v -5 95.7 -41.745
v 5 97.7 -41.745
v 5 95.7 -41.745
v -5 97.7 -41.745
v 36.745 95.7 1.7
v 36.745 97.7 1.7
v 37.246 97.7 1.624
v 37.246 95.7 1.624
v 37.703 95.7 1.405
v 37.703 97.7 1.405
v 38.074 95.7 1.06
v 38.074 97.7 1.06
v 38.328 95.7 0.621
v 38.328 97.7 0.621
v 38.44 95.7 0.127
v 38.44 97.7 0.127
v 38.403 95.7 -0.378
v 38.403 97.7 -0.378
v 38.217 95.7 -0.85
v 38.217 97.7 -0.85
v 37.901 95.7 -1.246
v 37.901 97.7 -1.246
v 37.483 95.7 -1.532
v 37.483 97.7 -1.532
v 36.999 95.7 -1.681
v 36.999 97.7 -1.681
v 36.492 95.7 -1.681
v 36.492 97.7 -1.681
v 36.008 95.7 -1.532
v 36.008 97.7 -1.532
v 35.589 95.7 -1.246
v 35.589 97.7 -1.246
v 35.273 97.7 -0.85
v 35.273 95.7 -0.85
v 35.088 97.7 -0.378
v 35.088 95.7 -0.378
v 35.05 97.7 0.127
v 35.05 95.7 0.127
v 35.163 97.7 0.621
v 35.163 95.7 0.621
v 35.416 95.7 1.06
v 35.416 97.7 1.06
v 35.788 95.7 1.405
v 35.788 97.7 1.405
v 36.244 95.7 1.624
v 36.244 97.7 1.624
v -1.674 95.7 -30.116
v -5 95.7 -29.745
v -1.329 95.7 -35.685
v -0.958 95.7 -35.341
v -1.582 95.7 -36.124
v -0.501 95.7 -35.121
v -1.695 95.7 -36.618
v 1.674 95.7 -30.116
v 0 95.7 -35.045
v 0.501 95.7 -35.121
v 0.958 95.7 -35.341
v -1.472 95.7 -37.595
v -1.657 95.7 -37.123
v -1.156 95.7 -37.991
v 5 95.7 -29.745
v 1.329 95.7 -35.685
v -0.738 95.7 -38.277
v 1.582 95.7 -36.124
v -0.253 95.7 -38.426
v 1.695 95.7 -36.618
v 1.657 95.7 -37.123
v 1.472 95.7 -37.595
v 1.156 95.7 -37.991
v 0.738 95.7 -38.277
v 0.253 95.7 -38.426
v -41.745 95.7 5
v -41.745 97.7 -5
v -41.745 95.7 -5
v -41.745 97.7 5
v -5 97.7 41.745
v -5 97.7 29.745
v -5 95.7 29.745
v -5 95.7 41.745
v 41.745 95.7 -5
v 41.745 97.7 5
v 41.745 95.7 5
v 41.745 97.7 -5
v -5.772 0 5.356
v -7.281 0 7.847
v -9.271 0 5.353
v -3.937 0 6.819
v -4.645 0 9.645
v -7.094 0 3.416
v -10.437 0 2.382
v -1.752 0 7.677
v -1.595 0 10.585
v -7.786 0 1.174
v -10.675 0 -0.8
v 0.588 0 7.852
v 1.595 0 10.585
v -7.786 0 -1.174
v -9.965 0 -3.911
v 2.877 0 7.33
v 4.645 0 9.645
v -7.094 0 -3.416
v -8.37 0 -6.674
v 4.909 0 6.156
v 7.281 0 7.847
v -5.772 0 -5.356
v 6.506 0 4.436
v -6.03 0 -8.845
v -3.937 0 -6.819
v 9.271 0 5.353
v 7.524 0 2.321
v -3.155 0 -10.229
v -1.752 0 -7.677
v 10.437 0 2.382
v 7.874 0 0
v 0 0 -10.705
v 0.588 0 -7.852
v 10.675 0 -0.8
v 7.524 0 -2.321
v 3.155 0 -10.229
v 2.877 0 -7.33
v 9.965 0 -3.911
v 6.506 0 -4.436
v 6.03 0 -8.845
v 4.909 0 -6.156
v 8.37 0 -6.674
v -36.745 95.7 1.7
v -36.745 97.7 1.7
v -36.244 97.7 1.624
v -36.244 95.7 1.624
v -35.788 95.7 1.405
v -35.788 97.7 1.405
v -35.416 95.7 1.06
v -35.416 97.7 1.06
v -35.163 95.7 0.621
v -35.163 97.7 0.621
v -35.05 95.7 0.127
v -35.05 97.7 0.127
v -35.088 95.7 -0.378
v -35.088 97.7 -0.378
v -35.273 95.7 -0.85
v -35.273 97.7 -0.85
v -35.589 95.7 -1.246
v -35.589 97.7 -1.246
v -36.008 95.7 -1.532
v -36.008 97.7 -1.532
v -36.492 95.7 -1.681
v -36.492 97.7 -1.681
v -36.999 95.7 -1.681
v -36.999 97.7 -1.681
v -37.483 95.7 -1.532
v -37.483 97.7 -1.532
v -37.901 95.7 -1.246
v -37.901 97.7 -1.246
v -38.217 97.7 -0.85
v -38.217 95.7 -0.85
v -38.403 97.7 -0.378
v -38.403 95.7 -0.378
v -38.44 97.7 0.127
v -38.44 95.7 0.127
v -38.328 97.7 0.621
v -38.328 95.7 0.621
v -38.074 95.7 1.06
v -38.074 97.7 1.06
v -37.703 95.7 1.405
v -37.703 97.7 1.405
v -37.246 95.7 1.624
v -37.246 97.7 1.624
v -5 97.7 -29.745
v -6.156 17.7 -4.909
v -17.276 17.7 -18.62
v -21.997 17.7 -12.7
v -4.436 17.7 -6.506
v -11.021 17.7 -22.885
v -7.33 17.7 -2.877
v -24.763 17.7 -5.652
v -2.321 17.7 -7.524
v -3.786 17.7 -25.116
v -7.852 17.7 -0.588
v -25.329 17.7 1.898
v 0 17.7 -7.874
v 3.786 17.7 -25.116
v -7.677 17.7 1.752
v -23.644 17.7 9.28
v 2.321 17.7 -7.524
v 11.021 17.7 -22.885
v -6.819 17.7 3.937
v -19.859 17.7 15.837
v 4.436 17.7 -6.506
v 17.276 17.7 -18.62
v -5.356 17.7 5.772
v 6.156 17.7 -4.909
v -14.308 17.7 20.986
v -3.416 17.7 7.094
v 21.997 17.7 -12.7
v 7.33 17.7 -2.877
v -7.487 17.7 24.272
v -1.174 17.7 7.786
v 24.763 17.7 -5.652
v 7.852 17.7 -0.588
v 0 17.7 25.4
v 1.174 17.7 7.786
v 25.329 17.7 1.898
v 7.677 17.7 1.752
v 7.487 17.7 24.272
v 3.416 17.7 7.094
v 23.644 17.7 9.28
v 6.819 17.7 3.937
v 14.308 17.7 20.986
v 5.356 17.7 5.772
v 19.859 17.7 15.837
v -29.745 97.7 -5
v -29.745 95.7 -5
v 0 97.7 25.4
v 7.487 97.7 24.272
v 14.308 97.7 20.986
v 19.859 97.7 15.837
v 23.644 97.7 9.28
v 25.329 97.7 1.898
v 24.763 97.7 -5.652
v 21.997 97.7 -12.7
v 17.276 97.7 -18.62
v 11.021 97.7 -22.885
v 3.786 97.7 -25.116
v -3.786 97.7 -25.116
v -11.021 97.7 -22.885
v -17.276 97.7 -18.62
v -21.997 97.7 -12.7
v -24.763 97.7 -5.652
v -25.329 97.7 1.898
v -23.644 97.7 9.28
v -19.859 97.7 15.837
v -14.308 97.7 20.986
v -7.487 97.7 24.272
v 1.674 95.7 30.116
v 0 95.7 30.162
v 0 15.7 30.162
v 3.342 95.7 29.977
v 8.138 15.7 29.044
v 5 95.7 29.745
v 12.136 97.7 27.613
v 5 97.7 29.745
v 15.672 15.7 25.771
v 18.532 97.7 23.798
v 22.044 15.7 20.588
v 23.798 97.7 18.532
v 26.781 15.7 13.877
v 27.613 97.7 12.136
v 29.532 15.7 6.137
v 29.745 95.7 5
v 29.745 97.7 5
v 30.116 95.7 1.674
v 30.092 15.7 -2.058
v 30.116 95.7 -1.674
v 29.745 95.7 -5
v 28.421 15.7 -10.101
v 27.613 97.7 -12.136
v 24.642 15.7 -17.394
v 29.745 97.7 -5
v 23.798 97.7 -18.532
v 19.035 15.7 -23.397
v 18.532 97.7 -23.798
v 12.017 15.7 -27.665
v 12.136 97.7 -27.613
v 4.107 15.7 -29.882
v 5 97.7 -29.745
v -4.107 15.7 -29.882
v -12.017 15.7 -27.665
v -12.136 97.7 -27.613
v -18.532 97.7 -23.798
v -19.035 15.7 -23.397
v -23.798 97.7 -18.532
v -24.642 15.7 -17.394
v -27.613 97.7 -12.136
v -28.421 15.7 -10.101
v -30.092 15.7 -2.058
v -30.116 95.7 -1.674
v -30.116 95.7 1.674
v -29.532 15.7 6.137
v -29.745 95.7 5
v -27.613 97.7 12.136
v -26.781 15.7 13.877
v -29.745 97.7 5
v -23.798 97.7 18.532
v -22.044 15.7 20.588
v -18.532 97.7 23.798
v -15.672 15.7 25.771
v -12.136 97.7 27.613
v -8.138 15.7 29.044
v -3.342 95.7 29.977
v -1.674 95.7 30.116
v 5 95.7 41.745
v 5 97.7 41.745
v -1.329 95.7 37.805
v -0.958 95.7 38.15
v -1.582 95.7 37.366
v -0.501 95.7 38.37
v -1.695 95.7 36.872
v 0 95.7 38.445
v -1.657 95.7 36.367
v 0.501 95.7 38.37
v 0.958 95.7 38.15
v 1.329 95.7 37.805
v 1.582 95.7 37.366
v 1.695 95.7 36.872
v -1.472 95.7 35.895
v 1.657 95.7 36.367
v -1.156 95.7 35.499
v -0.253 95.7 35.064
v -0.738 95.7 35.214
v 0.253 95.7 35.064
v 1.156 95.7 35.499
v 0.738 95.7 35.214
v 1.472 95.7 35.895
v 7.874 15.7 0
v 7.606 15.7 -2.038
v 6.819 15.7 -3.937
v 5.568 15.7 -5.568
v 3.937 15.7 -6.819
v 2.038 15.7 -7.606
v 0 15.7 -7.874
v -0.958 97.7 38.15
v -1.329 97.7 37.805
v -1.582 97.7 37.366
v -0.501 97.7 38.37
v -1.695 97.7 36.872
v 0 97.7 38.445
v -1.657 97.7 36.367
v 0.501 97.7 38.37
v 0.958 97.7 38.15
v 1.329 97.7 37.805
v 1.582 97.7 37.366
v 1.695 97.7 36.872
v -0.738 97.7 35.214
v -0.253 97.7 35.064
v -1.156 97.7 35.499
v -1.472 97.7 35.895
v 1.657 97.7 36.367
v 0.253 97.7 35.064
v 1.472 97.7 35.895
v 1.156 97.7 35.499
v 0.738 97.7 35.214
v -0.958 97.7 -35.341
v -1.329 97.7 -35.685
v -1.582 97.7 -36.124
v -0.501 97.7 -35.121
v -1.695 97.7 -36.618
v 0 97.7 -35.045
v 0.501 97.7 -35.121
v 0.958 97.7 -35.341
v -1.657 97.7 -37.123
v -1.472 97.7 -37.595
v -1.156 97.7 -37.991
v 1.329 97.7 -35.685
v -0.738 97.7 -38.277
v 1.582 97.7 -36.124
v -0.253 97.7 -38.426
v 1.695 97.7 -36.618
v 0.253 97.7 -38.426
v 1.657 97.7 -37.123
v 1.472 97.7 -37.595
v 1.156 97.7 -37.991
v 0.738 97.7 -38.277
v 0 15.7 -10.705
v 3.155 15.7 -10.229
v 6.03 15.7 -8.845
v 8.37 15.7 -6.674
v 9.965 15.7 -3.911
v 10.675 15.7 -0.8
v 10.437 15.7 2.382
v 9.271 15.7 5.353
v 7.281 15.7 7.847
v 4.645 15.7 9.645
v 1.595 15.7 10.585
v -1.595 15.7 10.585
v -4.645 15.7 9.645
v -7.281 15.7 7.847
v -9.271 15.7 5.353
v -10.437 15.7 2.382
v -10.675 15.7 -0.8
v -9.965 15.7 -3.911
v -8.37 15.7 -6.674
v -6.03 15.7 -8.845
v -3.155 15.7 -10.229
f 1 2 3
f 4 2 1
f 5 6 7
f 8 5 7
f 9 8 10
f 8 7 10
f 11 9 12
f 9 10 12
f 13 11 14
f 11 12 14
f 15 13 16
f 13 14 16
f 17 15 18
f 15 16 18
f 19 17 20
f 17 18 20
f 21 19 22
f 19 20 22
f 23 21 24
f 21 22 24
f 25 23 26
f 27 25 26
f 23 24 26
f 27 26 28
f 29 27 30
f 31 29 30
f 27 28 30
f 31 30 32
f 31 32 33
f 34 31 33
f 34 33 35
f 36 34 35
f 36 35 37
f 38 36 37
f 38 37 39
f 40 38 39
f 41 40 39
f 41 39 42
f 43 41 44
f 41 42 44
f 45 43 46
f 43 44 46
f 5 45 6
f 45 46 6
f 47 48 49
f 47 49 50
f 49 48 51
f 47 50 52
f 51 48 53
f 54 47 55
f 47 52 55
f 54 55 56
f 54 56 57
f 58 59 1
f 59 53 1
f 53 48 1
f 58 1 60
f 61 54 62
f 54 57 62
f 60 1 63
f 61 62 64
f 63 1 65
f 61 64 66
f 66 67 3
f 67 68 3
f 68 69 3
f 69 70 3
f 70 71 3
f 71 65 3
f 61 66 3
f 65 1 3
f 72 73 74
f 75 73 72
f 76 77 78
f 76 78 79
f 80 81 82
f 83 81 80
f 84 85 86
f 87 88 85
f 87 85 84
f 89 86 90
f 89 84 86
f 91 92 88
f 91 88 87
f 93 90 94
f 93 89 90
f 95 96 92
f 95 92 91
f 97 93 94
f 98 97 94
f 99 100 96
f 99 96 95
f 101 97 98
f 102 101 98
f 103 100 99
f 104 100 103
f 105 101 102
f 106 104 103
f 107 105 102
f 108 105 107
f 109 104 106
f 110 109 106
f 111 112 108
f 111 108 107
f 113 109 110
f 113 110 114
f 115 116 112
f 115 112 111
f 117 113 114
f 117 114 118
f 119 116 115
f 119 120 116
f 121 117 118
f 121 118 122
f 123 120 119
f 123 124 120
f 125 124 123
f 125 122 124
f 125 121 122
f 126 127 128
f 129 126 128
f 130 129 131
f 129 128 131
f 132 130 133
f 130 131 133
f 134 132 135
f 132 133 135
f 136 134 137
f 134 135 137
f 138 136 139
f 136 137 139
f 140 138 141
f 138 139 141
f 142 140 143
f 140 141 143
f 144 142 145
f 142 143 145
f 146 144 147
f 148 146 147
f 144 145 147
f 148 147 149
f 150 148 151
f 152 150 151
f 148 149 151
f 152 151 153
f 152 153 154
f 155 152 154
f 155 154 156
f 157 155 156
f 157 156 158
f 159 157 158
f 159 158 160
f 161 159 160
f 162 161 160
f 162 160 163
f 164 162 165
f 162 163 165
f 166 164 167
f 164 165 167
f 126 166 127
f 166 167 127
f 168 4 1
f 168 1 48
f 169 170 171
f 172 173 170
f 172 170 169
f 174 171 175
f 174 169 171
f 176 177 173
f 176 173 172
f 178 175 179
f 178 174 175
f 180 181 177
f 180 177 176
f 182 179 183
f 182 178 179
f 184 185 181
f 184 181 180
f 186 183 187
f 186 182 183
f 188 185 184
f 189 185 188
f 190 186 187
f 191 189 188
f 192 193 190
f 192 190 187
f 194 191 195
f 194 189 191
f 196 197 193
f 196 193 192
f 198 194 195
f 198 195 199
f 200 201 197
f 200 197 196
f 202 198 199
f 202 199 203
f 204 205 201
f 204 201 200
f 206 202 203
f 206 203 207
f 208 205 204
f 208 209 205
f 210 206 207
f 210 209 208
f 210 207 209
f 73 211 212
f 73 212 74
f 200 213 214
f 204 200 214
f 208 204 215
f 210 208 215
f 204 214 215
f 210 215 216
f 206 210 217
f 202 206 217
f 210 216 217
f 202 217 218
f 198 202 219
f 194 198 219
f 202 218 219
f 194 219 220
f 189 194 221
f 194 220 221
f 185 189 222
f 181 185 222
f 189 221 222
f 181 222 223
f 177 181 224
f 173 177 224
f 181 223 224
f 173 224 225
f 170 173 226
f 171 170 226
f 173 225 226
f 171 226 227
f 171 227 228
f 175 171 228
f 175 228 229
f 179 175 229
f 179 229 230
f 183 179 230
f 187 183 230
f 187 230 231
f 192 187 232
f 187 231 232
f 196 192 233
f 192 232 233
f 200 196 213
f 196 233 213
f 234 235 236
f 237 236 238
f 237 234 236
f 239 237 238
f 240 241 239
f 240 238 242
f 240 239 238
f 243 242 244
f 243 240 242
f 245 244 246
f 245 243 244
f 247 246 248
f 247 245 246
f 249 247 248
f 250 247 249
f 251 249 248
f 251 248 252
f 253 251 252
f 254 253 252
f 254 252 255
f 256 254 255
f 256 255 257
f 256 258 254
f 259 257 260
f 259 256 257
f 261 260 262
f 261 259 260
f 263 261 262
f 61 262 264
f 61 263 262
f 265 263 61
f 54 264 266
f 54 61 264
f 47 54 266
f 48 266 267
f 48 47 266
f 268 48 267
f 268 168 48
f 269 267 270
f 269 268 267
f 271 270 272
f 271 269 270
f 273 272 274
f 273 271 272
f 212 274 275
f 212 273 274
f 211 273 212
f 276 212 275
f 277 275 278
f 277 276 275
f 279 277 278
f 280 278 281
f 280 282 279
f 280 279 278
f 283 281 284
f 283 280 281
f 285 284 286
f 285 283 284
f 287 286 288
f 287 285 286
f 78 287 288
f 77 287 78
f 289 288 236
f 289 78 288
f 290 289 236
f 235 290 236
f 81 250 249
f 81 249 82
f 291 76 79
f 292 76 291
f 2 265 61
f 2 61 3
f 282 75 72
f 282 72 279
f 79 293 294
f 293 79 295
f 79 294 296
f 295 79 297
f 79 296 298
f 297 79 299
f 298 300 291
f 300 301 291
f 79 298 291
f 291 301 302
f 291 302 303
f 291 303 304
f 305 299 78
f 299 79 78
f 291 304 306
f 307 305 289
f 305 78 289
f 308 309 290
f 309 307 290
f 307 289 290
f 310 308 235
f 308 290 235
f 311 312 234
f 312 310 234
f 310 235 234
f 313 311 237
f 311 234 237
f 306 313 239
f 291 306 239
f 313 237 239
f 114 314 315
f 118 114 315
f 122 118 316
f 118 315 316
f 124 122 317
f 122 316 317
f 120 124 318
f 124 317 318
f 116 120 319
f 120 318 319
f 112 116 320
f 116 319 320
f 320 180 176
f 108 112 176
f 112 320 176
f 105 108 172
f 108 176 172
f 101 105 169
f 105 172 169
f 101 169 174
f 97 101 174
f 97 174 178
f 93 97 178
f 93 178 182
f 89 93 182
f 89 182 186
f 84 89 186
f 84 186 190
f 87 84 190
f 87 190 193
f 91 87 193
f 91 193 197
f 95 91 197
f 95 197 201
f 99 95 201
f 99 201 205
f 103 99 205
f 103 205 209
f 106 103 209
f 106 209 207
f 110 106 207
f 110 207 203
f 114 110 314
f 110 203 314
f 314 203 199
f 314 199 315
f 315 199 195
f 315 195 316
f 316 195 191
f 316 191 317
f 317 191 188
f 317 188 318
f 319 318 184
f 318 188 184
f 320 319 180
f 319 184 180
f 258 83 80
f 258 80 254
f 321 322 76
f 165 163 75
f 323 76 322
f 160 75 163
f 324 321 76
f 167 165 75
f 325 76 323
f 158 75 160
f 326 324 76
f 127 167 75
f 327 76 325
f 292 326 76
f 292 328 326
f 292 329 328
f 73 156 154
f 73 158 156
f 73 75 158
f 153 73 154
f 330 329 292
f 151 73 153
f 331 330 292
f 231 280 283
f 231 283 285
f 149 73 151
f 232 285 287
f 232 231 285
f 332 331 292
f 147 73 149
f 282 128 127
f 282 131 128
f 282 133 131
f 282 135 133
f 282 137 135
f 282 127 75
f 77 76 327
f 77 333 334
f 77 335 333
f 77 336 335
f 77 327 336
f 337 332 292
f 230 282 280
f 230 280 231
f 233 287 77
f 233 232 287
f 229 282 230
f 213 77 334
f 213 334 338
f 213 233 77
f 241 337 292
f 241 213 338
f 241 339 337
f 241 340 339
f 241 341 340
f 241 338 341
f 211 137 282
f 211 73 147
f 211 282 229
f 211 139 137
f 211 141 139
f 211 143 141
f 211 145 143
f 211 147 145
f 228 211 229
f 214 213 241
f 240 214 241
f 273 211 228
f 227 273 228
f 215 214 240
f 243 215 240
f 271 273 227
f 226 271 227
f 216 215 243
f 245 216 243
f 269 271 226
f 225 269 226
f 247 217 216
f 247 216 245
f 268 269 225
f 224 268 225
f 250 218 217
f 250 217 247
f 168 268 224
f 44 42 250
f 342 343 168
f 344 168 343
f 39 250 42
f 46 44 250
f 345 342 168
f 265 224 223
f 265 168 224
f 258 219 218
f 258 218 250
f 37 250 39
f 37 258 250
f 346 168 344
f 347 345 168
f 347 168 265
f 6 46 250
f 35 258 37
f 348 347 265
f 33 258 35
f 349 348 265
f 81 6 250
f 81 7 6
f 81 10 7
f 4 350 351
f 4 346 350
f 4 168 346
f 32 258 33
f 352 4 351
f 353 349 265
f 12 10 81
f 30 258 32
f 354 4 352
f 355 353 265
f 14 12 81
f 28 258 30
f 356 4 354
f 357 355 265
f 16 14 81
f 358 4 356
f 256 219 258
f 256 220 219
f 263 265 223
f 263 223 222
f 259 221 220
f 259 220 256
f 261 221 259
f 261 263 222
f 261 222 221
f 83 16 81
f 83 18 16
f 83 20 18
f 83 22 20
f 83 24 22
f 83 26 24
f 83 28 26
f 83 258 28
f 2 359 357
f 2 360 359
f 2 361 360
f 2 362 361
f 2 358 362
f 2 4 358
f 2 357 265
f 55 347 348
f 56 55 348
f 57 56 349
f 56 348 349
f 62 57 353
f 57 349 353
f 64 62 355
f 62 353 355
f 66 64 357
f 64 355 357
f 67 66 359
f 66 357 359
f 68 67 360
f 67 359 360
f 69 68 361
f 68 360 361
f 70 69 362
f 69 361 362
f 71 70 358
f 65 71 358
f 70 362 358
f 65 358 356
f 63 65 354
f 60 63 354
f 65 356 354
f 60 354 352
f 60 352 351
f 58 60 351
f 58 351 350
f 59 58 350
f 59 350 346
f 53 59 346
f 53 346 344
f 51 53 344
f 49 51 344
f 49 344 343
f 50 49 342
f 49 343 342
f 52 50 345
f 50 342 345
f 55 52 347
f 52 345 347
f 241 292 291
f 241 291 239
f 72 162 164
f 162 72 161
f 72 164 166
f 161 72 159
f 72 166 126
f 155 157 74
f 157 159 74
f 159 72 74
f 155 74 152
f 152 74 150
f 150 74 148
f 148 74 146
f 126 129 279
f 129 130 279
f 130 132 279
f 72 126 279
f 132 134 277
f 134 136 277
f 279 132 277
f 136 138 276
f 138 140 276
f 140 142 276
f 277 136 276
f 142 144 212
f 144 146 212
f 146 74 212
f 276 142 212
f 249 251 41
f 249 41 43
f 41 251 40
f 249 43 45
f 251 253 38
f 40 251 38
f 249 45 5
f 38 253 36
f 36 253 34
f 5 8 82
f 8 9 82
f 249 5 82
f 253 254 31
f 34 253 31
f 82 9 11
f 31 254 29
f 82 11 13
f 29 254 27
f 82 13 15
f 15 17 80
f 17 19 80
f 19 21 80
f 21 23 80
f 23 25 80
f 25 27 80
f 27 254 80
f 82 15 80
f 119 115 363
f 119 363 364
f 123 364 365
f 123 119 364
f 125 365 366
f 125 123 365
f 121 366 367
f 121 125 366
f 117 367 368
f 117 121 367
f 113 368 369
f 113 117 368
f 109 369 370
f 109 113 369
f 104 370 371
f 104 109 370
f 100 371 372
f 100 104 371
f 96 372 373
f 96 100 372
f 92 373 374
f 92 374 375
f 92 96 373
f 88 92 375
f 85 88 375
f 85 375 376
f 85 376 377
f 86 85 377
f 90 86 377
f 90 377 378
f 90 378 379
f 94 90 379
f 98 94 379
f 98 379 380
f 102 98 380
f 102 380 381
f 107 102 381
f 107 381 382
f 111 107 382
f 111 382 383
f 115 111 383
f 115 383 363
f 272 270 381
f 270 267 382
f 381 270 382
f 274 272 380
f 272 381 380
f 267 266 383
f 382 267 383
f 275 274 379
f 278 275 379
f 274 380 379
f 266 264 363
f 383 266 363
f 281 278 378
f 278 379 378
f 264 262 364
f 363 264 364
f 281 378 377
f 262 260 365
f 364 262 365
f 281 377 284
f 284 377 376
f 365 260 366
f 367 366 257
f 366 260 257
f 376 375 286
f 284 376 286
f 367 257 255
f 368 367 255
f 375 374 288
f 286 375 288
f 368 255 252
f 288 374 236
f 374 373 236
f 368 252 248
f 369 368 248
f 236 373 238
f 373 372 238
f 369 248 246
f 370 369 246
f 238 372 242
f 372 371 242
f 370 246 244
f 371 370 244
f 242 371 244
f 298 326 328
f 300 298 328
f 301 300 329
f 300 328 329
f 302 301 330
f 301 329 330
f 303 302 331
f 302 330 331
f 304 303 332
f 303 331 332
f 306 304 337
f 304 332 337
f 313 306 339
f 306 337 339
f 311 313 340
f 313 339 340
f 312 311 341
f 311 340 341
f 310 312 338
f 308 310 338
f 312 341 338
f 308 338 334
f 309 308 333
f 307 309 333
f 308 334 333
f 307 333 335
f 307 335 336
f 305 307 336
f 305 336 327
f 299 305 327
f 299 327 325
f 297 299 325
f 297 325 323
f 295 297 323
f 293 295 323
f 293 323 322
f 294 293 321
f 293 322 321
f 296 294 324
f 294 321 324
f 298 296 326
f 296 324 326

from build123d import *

# Parameters (mm, degrees)
SKETCH5_OUTSIDE_W   = 34.468
SKETCH5_OUTSIDE_H   = 34.468
CUT_EXTRUDE1_DEPTH  = 7.2
BOSS_EXTRUDE1_REACH = 51.718
SKETCH10_R          = 10.705
SKETCH10_R_2        = 6.9
BOSS_EXTRUDE3_REACH = 31.655
SKETCH12_R          = 8.3
CUT_EXTRUDE3_REACH  = 53.775
SKETCH13_R          = 3.45
SKETCH14_R          = 23.979548074
CUT_EXTRUDE5_DEPTH  = 32
BOSS_EXTRUDE4_START = 2
SKETCH16_R          = 30.1625
SKETCH16_R_2        = 7.874
BOSS_EXTRUDE4_DEPTH = 2
BOSS_EXTRUDE5_START = 80
SKETCH17_R          = 30.1625
SKETCH17_R_2        = 25.4
BOSS_EXTRUDE5_DEPTH = 80
SKETCH18_R          = 1.7
BOSS_EXTRUDE6_DEPTH = 2


# Read off the part's stored shape, not the designer's step: Cut-Extrude2
with BuildPart() as part:
    # Sketch1 → Revolve1 (revolve)
    with BuildSketch(Plane.XY, mode=Mode.PRIVATE) as revolve1_sk:
        Polygon((3.25, 47.7), (4.8, 47.7), (5.2, 43.217813034), (4.8, 42.533333333), (5.2, 38.051146367), (4.8, 37.366666667), (5.2, 32.8844797), (4.8, 32.2), (5.25, 26.2), (5.25, 22.2), (10.6, 22.2), (10.6, 15), (8.3, 15), (8.3, 0), (5.5, 0), (5.5, 18), (3.25, 19.7), align=None)
    revolve(revolve1_sk.sketch.rotate(Axis((0, 0, 0), (0, 1, 0)), 90), axis=Axis((0, 0, 0), (0, 1, 0)))

    # Sketch5 outside → Cut-Extrude1 (cut)
    with BuildSketch(Plane(origin=(0, 22.2, 0), x_dir=(1, 0, 0), z_dir=(0, 1, 0))):
        Rectangle(SKETCH5_OUTSIDE_W, SKETCH5_OUTSIDE_H)
        Polygon((-5.3, 9.17986928), (5.3, 9.17986928), (10.6, 0), (5.3, -9.17986928), (-5.3, -9.17986928), (-10.6, 0), align=None, mode=Mode.SUBTRACT)
    extrude(amount=-CUT_EXTRUDE1_DEPTH, mode=Mode.SUBTRACT)

    # Sketch4 → Cut-Revolve1 (revolve, cut)
    with BuildSketch(Plane.XY, mode=Mode.PRIVATE) as cut_revolve1_sk:
        Polygon((6.9, 0), (8.3, 1.4), (8.3, 0), align=None)
        Polygon((8.3, 15), (10.6, 15.837131539), (10.6, 15), align=None)
        Polygon((8.3, 22.2), (10.6, 21.362868461), (10.6, 22.2), align=None)
    revolve(cut_revolve1_sk.sketch.rotate(Axis((0, 0, 0), (0, 1, 0)), 90), axis=Axis((0, 0, 0), (0, 1, 0)), mode=Mode.SUBTRACT)

    # Boss-Extrude1: up to this cone (the profile starts outside it)
    boss_extrude1_end = Plane(origin=(0, 0, 0), z_dir=(0, 1, 0)).offset(11.979048056) * Cone(2.747e-06, 110.555614597, 40.238951944, align=(Align.CENTER, Align.CENTER, Align.MIN), mode=Mode.PRIVATE)
    # Sketch10 → Boss-Extrude1 (add, up to the surface)
    with BuildSketch(Plane.XZ, mode=Mode.PRIVATE) as boss_extrude1_sk1:
        with Locations(Location((0, 0, 0), (0, 0, 270))):
            Circle(SKETCH10_R)
        Circle(SKETCH10_R_2, mode=Mode.SUBTRACT)
    boss_extrude1_tool1 = extrude(boss_extrude1_sk1.sketch, amount=-BOSS_EXTRUDE1_REACH, mode=Mode.PRIVATE) - boss_extrude1_end
    add(boss_extrude1_tool1.solids().sort_by_distance((0, 0, 10.402217))[0])

    # Cut-Extrude2 outline → Cut-Extrude2 (revolve, cut)
    with BuildSketch(Plane.XY):
        Polygon((7.874, 16.206311111), (5.5, 18), (5.5, 0), (7.874, 0), align=None)
    revolve(axis=Axis((0, 0, 0), (0, 1, 0)), mode=Mode.SUBTRACT)

    # Boss-Extrude3: up to this cone (the profile starts inside it)
    boss_extrude3_end = Plane(origin=(0, 22.2, 0), z_dir=(0, 1, 0)).offset(-10.220951944) * Cone(2.747e-06, 193.581188051, 70.457789364, align=(Align.CENTER, Align.CENTER, Align.MIN), mode=Mode.PRIVATE)
    # Sketch12 → Boss-Extrude3 (add, up to the surface)
    with BuildSketch(Plane(origin=(0, 22.2, 0), x_dir=(1, 0, 0), z_dir=(0, 1, 0)), mode=Mode.PRIVATE) as boss_extrude3_sk1:
        Polygon((-7.609401077, 13.17986928), (-15.218802154, 0), (-7.609401077, -13.17986928), (7.609401077, -13.17986928), (15.218802154, 0), (7.609401077, 13.17986928), align=None)
        Circle(SKETCH12_R, mode=Mode.SUBTRACT)
    boss_extrude3_tool1 = extrude(boss_extrude3_sk1.sketch, amount=-BOSS_EXTRUDE3_REACH, mode=Mode.PRIVATE) & boss_extrude3_end
    add(boss_extrude3_tool1.solids().sort_by_distance((-11.065395, 22.2, -6.388609))[0])

    # Cut-Extrude3: up to this cone (the profile starts outside it)
    cut_extrude3_end = Plane(origin=(0, 47.7, 0), z_dir=(0, -1, 0)).offset(25.544445444) * Cone(1.324e-06, 38.025735294, 28.730554556, align=(Align.CENTER, Align.CENTER, Align.MIN), mode=Mode.PRIVATE)
    # Sketch13 → Cut-Extrude3 (cut, up to the surface)
    with BuildSketch(Plane(origin=(0, 47.7, 0), x_dir=(1, 0, 0), z_dir=(0, 1, 0)), mode=Mode.PRIVATE) as cut_extrude3_sk1:
        with Locations(Location((0, 0, 0), (0, 0, 270))):
            Circle(SKETCH13_R)
    cut_extrude3_tool1 = extrude(cut_extrude3_sk1.sketch, amount=-CUT_EXTRUDE3_REACH, mode=Mode.PRIVATE) - cut_extrude3_end
    add(cut_extrude3_tool1.solids().sort_by_distance((0, 47.7, 0))[0], mode=Mode.SUBTRACT)

    # Sketch14 → Cut-Extrude5 (cut)
    with BuildSketch(Plane(origin=(0, 47.7, 0), x_dir=(1, 0, 0), z_dir=(0, 1, 0))):
        Circle(SKETCH14_R)
    extrude(amount=-CUT_EXTRUDE5_DEPTH, mode=Mode.SUBTRACT)

    # Sketch16 → Boss-Extrude4 (add)
    with BuildSketch(Plane(origin=(0, 15.7, 0), x_dir=(1, 0, 0), z_dir=(0, 1, 0)).offset(BOSS_EXTRUDE4_START)):
        with Locations(Location((0, 0, 0), (0, 0, 270))):
            Circle(SKETCH16_R)
        with Locations(Location((0, 0, 0), (0, 0, 90))):
            Circle(SKETCH16_R_2, mode=Mode.SUBTRACT)
    extrude(amount=-BOSS_EXTRUDE4_DEPTH)

    # Sketch17 → Boss-Extrude5 (add)
    with BuildSketch(Plane(origin=(0, 17.7, 0), x_dir=(1, 0, 0), z_dir=(0, 1, 0)).offset(BOSS_EXTRUDE5_START)):
        with Locations(Location((0, 0, 0), (0, 0, 270))):
            Circle(SKETCH17_R)
        with Locations(Location((0, 0, 0), (0, 0, 270))):
            Circle(SKETCH17_R_2, mode=Mode.SUBTRACT)
    extrude(amount=-BOSS_EXTRUDE5_DEPTH)

    # Sketch18 → Boss-Extrude6 (add)
    # profile 1 of 8: a face of its own
    with BuildSketch(Plane(origin=(0, 97.7, 0), x_dir=(1, 0, 0), z_dir=(0, 1, 0))):
        with BuildLine():
            ThreePointArc((-29.745191313, -5), (-30.1625, 0), (-29.745191313, 5))
            Line((-29.745191313, 5), (-41.745191313, 5))
            Line((-41.745191313, 5), (-41.745191313, -5))
            Line((-41.745191313, -5), (-29.745191313, -5))
        make_face()
        with Locations(Location((-36.745191313, 0, 0), (0, 0, 270))):
            Circle(SKETCH18_R, mode=Mode.SUBTRACT)
    # profile 2 of 8: a face of its own
    with BuildSketch(Plane(origin=(0, 97.7, 0), x_dir=(1, 0, 0), z_dir=(0, 1, 0))):
        with BuildLine():
            Line((-29.745191313, -5), (-29.745191313, 5))
            ThreePointArc((-29.745191313, 5), (-30.1625, 0), (-29.745191313, -5))
        make_face()
    # profile 3 of 8: a face of its own
    with BuildSketch(Plane(origin=(0, 97.7, 0), x_dir=(1, 0, 0), z_dir=(0, 1, 0))):
        with BuildLine():
            ThreePointArc((29.745191313, -5), (30.1625, 0), (29.745191313, 5))
            Line((29.745191313, 5), (29.745191313, -5))
        make_face()
    # profile 4 of 8: a face of its own
    with BuildSketch(Plane(origin=(0, 97.7, 0), x_dir=(1, 0, 0), z_dir=(0, 1, 0))):
        with BuildLine():
            Line((41.745191313, 5), (29.745191313, 5))
            ThreePointArc((29.745191313, 5), (30.1625, 0), (29.745191313, -5))
            Line((29.745191313, -5), (41.745191313, -5))
            Line((41.745191313, -5), (41.745191313, 5))
        make_face()
        with Locations(Location((36.745191313, 0, 0), (0, 0, 270))):
            Circle(SKETCH18_R, mode=Mode.SUBTRACT)
    # profile 5 of 8: a face of its own
    with BuildSketch(Plane(origin=(0, 97.7, 0), x_dir=(1, 0, 0), z_dir=(0, 1, 0))):
        with BuildLine():
            ThreePointArc((5, -29.745191313), (0, -30.1625), (-5, -29.745191313))
            Line((-5, -29.745191313), (-5, -41.745191313))
            Line((-5, -41.745191313), (5, -41.745191313))
            Line((5, -41.745191313), (5, -29.745191313))
        make_face()
        with Locations(Location((0, -36.745191313, 0), (0, 0, 270))):
            Circle(SKETCH18_R, mode=Mode.SUBTRACT)
    # profile 6 of 8: a face of its own
    with BuildSketch(Plane(origin=(0, 97.7, 0), x_dir=(1, 0, 0), z_dir=(0, 1, 0))):
        with BuildLine():
            Line((5, -29.745191313), (-5, -29.745191313))
            ThreePointArc((-5, -29.745191313), (0, -30.1625), (5, -29.745191313))
        make_face()
    # profile 7 of 8: a face of its own
    with BuildSketch(Plane(origin=(0, 97.7, 0), x_dir=(1, 0, 0), z_dir=(0, 1, 0))):
        with BuildLine():
            ThreePointArc((5, 29.745191313), (0, 30.1625), (-5, 29.745191313))
            Line((-5, 29.745191313), (5, 29.745191313))
        make_face()
    # profile 8 of 8: a face of its own
    with BuildSketch(Plane(origin=(0, 97.7, 0), x_dir=(1, 0, 0), z_dir=(0, 1, 0))):
        with BuildLine():
            Line((-5, 41.745191313), (-5, 29.745191313))
            ThreePointArc((-5, 29.745191313), (0, 30.1625), (5, 29.745191313))
            Line((5, 29.745191313), (5, 41.745191313))
            Line((5, 41.745191313), (-5, 41.745191313))
        make_face()
        with Locations(Location((0, 36.745191313, 0), (0, 0, 270))):
            Circle(SKETCH18_R, mode=Mode.SUBTRACT)
    extrude(amount=-BOSS_EXTRUDE6_DEPTH)


solid = part.part
